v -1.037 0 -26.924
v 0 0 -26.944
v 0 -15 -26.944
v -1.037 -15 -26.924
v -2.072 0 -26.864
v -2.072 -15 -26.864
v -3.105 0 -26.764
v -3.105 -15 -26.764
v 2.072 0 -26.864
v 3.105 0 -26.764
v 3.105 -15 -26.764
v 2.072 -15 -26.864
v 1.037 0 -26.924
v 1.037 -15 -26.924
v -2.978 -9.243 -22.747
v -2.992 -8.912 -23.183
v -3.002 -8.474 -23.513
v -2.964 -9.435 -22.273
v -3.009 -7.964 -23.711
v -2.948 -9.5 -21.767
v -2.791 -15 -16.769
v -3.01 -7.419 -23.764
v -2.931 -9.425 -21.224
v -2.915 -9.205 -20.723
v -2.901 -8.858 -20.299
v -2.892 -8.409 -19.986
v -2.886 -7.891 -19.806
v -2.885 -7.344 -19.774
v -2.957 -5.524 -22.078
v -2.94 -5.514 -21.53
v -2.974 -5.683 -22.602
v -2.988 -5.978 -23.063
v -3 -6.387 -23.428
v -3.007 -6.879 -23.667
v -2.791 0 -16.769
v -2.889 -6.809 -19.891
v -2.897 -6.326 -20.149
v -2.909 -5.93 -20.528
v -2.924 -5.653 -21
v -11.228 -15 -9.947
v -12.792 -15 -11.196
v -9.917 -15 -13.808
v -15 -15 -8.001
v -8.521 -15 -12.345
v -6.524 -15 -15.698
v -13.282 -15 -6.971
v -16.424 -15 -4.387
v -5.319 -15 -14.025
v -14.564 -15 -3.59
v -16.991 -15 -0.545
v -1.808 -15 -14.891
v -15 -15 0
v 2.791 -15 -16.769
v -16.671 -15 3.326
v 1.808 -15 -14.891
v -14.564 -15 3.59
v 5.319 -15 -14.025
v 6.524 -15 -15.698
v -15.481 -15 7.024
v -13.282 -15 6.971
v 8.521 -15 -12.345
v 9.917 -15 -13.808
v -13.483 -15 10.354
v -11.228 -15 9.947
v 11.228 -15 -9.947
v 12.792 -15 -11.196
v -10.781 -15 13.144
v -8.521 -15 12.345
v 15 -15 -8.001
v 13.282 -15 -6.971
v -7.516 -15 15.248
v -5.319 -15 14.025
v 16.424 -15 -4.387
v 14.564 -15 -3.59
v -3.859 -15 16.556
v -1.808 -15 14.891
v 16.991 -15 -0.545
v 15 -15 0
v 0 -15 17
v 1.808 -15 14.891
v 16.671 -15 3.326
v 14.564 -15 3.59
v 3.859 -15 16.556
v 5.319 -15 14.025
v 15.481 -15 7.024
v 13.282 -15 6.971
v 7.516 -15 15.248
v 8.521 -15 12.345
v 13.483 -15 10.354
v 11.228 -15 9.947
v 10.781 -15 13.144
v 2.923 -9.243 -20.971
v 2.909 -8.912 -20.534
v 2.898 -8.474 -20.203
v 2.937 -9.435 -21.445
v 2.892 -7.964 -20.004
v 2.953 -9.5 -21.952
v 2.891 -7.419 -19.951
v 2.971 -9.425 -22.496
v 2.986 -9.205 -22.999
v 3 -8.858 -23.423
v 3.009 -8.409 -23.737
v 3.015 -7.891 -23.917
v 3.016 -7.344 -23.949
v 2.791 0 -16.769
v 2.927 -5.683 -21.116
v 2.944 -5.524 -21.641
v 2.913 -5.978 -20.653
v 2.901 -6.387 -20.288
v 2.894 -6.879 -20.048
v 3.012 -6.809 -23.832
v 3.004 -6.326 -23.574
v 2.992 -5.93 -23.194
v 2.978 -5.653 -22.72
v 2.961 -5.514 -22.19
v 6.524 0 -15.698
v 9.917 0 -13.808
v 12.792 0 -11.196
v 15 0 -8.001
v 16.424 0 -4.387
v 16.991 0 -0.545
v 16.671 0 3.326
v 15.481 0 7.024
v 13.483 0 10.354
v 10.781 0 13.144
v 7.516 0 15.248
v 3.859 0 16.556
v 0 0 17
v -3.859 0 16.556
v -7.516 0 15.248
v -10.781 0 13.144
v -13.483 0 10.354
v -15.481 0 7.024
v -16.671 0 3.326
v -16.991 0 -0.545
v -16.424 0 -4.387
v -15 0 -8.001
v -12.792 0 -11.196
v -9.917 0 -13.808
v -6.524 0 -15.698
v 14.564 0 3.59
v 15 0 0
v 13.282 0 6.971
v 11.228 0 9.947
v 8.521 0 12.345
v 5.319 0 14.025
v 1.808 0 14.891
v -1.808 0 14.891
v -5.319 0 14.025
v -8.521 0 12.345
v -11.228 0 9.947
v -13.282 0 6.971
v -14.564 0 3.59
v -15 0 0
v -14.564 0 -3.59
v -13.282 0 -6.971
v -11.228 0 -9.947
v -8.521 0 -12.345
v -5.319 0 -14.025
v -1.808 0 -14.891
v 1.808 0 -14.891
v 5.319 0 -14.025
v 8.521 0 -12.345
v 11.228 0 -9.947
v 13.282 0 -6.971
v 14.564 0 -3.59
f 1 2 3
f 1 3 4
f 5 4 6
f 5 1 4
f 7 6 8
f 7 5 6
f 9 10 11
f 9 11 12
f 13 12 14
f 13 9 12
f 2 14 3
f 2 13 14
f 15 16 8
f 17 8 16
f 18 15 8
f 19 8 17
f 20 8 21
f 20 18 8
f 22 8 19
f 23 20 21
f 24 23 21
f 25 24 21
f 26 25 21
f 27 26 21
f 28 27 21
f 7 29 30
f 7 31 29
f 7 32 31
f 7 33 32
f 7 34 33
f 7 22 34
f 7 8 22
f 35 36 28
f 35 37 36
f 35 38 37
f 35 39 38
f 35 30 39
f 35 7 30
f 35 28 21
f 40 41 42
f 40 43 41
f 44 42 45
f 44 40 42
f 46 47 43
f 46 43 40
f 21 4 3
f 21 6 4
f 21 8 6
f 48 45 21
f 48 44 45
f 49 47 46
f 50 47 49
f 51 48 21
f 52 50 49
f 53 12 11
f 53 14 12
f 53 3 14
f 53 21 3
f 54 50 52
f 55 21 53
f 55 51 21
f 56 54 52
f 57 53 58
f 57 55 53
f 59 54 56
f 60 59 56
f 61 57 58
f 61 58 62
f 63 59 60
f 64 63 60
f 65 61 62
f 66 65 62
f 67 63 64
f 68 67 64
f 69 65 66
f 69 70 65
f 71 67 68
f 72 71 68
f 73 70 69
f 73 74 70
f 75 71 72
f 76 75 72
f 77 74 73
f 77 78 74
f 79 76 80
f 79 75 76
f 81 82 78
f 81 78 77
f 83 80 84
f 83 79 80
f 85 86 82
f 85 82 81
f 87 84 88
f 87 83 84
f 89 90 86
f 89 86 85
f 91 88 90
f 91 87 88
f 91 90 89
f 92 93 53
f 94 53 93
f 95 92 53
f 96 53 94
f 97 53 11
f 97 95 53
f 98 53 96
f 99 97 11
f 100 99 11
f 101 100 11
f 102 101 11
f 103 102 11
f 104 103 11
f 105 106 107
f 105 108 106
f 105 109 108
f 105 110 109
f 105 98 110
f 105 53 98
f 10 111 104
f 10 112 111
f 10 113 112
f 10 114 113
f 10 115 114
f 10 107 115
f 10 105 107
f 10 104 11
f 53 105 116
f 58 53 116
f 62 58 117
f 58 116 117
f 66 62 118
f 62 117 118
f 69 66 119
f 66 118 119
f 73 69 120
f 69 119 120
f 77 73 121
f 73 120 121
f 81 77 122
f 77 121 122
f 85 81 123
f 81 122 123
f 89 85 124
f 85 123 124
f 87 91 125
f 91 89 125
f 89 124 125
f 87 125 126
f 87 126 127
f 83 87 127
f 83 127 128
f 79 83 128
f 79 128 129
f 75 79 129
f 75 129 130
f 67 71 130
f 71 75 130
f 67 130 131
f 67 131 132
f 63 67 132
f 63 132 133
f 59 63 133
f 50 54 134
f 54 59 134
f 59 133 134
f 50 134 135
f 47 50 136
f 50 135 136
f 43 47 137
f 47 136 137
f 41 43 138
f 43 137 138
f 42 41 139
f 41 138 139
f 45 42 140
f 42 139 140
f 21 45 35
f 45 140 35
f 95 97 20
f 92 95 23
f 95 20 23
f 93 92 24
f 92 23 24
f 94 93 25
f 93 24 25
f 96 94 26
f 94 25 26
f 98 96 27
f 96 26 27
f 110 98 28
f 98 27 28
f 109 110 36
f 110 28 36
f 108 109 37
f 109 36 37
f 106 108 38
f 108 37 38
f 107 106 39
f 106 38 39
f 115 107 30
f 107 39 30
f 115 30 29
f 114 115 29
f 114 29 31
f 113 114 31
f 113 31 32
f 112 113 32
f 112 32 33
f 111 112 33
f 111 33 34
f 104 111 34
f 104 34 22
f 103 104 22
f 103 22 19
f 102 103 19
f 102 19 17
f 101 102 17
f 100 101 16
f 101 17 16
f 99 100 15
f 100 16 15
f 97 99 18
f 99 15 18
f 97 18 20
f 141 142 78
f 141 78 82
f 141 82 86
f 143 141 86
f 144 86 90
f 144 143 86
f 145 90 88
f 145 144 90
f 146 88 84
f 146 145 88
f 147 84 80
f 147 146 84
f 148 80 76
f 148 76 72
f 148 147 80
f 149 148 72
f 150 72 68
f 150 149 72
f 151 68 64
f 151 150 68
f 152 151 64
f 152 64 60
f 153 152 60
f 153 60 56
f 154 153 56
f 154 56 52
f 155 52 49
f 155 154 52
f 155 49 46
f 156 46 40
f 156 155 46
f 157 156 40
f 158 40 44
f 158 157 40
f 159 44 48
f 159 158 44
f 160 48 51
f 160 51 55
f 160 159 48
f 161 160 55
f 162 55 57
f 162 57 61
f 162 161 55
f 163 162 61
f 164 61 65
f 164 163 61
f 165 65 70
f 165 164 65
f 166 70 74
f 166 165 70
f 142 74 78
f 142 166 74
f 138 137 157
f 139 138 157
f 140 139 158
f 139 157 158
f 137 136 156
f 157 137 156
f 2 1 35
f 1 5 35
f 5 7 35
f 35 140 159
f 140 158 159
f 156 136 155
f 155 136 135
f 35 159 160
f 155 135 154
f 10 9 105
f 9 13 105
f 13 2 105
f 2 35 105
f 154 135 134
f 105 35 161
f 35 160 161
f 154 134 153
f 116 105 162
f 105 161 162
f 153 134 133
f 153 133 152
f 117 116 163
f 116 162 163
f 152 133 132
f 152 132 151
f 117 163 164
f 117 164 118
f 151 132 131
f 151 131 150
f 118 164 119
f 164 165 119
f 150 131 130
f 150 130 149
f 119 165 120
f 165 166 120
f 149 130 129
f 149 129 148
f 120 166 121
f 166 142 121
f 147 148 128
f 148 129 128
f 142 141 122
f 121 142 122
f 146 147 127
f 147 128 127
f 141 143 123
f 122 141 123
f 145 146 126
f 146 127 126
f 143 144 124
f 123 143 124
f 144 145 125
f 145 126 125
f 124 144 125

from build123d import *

# Parameters (mm, degrees)
F0_R     = 17
F0_R_2   = 15
F1_DEPTH = 15
F3_DEPTH = 15
F4_R     = 2
F5_DEPTH = 20.10135


with BuildPart() as f1:
    # F0 (on Front) → F1 (new body)
    with BuildSketch(Plane.XZ):
        Circle(F0_R)
        Circle(F0_R_2, mode=Mode.SUBTRACT)
    extrude(amount=F1_DEPTH)

    # F2 (on face) → F3 (join)
    with BuildSketch(Plane(origin=(0, 0, 0), x_dir=(-1, 0, 0), z_dir=(0, 1, 0))):
        with BuildLine():
            Line((-2.790576, -16.769397), (-3.104631, -26.764465))
            ThreePointArc((-3.104631, -26.764465), (-1.554907, -26.899025), (0, -26.943929))
            ThreePointArc((0, -26.943929), (1.554907, -26.899025), (3.104631, -26.764465))
            Line((3.104631, -26.764465), (2.790576, -16.769397))
            ThreePointArc((2.790576, -16.769397), (1.400044, -16.942251), (0, -17))
            ThreePointArc((0, -17), (-1.400044, -16.942251), (-2.790576, -16.769397))
        make_face()
    extrude(amount=-F3_DEPTH)

    # F4 (on face) → F5 (cut, through all)
    with BuildSketch(Plane(origin=(-2.261431, 0, 0.071057), x_dir=(0, -1, 0), z_dir=(-0.999507, 0, 0.031406))):
        with Locations((7.5, -21.848765)):
            Circle(F4_R)
    extrude(amount=-F5_DEPTH, mode=Mode.SUBTRACT)


solid = f1.part
